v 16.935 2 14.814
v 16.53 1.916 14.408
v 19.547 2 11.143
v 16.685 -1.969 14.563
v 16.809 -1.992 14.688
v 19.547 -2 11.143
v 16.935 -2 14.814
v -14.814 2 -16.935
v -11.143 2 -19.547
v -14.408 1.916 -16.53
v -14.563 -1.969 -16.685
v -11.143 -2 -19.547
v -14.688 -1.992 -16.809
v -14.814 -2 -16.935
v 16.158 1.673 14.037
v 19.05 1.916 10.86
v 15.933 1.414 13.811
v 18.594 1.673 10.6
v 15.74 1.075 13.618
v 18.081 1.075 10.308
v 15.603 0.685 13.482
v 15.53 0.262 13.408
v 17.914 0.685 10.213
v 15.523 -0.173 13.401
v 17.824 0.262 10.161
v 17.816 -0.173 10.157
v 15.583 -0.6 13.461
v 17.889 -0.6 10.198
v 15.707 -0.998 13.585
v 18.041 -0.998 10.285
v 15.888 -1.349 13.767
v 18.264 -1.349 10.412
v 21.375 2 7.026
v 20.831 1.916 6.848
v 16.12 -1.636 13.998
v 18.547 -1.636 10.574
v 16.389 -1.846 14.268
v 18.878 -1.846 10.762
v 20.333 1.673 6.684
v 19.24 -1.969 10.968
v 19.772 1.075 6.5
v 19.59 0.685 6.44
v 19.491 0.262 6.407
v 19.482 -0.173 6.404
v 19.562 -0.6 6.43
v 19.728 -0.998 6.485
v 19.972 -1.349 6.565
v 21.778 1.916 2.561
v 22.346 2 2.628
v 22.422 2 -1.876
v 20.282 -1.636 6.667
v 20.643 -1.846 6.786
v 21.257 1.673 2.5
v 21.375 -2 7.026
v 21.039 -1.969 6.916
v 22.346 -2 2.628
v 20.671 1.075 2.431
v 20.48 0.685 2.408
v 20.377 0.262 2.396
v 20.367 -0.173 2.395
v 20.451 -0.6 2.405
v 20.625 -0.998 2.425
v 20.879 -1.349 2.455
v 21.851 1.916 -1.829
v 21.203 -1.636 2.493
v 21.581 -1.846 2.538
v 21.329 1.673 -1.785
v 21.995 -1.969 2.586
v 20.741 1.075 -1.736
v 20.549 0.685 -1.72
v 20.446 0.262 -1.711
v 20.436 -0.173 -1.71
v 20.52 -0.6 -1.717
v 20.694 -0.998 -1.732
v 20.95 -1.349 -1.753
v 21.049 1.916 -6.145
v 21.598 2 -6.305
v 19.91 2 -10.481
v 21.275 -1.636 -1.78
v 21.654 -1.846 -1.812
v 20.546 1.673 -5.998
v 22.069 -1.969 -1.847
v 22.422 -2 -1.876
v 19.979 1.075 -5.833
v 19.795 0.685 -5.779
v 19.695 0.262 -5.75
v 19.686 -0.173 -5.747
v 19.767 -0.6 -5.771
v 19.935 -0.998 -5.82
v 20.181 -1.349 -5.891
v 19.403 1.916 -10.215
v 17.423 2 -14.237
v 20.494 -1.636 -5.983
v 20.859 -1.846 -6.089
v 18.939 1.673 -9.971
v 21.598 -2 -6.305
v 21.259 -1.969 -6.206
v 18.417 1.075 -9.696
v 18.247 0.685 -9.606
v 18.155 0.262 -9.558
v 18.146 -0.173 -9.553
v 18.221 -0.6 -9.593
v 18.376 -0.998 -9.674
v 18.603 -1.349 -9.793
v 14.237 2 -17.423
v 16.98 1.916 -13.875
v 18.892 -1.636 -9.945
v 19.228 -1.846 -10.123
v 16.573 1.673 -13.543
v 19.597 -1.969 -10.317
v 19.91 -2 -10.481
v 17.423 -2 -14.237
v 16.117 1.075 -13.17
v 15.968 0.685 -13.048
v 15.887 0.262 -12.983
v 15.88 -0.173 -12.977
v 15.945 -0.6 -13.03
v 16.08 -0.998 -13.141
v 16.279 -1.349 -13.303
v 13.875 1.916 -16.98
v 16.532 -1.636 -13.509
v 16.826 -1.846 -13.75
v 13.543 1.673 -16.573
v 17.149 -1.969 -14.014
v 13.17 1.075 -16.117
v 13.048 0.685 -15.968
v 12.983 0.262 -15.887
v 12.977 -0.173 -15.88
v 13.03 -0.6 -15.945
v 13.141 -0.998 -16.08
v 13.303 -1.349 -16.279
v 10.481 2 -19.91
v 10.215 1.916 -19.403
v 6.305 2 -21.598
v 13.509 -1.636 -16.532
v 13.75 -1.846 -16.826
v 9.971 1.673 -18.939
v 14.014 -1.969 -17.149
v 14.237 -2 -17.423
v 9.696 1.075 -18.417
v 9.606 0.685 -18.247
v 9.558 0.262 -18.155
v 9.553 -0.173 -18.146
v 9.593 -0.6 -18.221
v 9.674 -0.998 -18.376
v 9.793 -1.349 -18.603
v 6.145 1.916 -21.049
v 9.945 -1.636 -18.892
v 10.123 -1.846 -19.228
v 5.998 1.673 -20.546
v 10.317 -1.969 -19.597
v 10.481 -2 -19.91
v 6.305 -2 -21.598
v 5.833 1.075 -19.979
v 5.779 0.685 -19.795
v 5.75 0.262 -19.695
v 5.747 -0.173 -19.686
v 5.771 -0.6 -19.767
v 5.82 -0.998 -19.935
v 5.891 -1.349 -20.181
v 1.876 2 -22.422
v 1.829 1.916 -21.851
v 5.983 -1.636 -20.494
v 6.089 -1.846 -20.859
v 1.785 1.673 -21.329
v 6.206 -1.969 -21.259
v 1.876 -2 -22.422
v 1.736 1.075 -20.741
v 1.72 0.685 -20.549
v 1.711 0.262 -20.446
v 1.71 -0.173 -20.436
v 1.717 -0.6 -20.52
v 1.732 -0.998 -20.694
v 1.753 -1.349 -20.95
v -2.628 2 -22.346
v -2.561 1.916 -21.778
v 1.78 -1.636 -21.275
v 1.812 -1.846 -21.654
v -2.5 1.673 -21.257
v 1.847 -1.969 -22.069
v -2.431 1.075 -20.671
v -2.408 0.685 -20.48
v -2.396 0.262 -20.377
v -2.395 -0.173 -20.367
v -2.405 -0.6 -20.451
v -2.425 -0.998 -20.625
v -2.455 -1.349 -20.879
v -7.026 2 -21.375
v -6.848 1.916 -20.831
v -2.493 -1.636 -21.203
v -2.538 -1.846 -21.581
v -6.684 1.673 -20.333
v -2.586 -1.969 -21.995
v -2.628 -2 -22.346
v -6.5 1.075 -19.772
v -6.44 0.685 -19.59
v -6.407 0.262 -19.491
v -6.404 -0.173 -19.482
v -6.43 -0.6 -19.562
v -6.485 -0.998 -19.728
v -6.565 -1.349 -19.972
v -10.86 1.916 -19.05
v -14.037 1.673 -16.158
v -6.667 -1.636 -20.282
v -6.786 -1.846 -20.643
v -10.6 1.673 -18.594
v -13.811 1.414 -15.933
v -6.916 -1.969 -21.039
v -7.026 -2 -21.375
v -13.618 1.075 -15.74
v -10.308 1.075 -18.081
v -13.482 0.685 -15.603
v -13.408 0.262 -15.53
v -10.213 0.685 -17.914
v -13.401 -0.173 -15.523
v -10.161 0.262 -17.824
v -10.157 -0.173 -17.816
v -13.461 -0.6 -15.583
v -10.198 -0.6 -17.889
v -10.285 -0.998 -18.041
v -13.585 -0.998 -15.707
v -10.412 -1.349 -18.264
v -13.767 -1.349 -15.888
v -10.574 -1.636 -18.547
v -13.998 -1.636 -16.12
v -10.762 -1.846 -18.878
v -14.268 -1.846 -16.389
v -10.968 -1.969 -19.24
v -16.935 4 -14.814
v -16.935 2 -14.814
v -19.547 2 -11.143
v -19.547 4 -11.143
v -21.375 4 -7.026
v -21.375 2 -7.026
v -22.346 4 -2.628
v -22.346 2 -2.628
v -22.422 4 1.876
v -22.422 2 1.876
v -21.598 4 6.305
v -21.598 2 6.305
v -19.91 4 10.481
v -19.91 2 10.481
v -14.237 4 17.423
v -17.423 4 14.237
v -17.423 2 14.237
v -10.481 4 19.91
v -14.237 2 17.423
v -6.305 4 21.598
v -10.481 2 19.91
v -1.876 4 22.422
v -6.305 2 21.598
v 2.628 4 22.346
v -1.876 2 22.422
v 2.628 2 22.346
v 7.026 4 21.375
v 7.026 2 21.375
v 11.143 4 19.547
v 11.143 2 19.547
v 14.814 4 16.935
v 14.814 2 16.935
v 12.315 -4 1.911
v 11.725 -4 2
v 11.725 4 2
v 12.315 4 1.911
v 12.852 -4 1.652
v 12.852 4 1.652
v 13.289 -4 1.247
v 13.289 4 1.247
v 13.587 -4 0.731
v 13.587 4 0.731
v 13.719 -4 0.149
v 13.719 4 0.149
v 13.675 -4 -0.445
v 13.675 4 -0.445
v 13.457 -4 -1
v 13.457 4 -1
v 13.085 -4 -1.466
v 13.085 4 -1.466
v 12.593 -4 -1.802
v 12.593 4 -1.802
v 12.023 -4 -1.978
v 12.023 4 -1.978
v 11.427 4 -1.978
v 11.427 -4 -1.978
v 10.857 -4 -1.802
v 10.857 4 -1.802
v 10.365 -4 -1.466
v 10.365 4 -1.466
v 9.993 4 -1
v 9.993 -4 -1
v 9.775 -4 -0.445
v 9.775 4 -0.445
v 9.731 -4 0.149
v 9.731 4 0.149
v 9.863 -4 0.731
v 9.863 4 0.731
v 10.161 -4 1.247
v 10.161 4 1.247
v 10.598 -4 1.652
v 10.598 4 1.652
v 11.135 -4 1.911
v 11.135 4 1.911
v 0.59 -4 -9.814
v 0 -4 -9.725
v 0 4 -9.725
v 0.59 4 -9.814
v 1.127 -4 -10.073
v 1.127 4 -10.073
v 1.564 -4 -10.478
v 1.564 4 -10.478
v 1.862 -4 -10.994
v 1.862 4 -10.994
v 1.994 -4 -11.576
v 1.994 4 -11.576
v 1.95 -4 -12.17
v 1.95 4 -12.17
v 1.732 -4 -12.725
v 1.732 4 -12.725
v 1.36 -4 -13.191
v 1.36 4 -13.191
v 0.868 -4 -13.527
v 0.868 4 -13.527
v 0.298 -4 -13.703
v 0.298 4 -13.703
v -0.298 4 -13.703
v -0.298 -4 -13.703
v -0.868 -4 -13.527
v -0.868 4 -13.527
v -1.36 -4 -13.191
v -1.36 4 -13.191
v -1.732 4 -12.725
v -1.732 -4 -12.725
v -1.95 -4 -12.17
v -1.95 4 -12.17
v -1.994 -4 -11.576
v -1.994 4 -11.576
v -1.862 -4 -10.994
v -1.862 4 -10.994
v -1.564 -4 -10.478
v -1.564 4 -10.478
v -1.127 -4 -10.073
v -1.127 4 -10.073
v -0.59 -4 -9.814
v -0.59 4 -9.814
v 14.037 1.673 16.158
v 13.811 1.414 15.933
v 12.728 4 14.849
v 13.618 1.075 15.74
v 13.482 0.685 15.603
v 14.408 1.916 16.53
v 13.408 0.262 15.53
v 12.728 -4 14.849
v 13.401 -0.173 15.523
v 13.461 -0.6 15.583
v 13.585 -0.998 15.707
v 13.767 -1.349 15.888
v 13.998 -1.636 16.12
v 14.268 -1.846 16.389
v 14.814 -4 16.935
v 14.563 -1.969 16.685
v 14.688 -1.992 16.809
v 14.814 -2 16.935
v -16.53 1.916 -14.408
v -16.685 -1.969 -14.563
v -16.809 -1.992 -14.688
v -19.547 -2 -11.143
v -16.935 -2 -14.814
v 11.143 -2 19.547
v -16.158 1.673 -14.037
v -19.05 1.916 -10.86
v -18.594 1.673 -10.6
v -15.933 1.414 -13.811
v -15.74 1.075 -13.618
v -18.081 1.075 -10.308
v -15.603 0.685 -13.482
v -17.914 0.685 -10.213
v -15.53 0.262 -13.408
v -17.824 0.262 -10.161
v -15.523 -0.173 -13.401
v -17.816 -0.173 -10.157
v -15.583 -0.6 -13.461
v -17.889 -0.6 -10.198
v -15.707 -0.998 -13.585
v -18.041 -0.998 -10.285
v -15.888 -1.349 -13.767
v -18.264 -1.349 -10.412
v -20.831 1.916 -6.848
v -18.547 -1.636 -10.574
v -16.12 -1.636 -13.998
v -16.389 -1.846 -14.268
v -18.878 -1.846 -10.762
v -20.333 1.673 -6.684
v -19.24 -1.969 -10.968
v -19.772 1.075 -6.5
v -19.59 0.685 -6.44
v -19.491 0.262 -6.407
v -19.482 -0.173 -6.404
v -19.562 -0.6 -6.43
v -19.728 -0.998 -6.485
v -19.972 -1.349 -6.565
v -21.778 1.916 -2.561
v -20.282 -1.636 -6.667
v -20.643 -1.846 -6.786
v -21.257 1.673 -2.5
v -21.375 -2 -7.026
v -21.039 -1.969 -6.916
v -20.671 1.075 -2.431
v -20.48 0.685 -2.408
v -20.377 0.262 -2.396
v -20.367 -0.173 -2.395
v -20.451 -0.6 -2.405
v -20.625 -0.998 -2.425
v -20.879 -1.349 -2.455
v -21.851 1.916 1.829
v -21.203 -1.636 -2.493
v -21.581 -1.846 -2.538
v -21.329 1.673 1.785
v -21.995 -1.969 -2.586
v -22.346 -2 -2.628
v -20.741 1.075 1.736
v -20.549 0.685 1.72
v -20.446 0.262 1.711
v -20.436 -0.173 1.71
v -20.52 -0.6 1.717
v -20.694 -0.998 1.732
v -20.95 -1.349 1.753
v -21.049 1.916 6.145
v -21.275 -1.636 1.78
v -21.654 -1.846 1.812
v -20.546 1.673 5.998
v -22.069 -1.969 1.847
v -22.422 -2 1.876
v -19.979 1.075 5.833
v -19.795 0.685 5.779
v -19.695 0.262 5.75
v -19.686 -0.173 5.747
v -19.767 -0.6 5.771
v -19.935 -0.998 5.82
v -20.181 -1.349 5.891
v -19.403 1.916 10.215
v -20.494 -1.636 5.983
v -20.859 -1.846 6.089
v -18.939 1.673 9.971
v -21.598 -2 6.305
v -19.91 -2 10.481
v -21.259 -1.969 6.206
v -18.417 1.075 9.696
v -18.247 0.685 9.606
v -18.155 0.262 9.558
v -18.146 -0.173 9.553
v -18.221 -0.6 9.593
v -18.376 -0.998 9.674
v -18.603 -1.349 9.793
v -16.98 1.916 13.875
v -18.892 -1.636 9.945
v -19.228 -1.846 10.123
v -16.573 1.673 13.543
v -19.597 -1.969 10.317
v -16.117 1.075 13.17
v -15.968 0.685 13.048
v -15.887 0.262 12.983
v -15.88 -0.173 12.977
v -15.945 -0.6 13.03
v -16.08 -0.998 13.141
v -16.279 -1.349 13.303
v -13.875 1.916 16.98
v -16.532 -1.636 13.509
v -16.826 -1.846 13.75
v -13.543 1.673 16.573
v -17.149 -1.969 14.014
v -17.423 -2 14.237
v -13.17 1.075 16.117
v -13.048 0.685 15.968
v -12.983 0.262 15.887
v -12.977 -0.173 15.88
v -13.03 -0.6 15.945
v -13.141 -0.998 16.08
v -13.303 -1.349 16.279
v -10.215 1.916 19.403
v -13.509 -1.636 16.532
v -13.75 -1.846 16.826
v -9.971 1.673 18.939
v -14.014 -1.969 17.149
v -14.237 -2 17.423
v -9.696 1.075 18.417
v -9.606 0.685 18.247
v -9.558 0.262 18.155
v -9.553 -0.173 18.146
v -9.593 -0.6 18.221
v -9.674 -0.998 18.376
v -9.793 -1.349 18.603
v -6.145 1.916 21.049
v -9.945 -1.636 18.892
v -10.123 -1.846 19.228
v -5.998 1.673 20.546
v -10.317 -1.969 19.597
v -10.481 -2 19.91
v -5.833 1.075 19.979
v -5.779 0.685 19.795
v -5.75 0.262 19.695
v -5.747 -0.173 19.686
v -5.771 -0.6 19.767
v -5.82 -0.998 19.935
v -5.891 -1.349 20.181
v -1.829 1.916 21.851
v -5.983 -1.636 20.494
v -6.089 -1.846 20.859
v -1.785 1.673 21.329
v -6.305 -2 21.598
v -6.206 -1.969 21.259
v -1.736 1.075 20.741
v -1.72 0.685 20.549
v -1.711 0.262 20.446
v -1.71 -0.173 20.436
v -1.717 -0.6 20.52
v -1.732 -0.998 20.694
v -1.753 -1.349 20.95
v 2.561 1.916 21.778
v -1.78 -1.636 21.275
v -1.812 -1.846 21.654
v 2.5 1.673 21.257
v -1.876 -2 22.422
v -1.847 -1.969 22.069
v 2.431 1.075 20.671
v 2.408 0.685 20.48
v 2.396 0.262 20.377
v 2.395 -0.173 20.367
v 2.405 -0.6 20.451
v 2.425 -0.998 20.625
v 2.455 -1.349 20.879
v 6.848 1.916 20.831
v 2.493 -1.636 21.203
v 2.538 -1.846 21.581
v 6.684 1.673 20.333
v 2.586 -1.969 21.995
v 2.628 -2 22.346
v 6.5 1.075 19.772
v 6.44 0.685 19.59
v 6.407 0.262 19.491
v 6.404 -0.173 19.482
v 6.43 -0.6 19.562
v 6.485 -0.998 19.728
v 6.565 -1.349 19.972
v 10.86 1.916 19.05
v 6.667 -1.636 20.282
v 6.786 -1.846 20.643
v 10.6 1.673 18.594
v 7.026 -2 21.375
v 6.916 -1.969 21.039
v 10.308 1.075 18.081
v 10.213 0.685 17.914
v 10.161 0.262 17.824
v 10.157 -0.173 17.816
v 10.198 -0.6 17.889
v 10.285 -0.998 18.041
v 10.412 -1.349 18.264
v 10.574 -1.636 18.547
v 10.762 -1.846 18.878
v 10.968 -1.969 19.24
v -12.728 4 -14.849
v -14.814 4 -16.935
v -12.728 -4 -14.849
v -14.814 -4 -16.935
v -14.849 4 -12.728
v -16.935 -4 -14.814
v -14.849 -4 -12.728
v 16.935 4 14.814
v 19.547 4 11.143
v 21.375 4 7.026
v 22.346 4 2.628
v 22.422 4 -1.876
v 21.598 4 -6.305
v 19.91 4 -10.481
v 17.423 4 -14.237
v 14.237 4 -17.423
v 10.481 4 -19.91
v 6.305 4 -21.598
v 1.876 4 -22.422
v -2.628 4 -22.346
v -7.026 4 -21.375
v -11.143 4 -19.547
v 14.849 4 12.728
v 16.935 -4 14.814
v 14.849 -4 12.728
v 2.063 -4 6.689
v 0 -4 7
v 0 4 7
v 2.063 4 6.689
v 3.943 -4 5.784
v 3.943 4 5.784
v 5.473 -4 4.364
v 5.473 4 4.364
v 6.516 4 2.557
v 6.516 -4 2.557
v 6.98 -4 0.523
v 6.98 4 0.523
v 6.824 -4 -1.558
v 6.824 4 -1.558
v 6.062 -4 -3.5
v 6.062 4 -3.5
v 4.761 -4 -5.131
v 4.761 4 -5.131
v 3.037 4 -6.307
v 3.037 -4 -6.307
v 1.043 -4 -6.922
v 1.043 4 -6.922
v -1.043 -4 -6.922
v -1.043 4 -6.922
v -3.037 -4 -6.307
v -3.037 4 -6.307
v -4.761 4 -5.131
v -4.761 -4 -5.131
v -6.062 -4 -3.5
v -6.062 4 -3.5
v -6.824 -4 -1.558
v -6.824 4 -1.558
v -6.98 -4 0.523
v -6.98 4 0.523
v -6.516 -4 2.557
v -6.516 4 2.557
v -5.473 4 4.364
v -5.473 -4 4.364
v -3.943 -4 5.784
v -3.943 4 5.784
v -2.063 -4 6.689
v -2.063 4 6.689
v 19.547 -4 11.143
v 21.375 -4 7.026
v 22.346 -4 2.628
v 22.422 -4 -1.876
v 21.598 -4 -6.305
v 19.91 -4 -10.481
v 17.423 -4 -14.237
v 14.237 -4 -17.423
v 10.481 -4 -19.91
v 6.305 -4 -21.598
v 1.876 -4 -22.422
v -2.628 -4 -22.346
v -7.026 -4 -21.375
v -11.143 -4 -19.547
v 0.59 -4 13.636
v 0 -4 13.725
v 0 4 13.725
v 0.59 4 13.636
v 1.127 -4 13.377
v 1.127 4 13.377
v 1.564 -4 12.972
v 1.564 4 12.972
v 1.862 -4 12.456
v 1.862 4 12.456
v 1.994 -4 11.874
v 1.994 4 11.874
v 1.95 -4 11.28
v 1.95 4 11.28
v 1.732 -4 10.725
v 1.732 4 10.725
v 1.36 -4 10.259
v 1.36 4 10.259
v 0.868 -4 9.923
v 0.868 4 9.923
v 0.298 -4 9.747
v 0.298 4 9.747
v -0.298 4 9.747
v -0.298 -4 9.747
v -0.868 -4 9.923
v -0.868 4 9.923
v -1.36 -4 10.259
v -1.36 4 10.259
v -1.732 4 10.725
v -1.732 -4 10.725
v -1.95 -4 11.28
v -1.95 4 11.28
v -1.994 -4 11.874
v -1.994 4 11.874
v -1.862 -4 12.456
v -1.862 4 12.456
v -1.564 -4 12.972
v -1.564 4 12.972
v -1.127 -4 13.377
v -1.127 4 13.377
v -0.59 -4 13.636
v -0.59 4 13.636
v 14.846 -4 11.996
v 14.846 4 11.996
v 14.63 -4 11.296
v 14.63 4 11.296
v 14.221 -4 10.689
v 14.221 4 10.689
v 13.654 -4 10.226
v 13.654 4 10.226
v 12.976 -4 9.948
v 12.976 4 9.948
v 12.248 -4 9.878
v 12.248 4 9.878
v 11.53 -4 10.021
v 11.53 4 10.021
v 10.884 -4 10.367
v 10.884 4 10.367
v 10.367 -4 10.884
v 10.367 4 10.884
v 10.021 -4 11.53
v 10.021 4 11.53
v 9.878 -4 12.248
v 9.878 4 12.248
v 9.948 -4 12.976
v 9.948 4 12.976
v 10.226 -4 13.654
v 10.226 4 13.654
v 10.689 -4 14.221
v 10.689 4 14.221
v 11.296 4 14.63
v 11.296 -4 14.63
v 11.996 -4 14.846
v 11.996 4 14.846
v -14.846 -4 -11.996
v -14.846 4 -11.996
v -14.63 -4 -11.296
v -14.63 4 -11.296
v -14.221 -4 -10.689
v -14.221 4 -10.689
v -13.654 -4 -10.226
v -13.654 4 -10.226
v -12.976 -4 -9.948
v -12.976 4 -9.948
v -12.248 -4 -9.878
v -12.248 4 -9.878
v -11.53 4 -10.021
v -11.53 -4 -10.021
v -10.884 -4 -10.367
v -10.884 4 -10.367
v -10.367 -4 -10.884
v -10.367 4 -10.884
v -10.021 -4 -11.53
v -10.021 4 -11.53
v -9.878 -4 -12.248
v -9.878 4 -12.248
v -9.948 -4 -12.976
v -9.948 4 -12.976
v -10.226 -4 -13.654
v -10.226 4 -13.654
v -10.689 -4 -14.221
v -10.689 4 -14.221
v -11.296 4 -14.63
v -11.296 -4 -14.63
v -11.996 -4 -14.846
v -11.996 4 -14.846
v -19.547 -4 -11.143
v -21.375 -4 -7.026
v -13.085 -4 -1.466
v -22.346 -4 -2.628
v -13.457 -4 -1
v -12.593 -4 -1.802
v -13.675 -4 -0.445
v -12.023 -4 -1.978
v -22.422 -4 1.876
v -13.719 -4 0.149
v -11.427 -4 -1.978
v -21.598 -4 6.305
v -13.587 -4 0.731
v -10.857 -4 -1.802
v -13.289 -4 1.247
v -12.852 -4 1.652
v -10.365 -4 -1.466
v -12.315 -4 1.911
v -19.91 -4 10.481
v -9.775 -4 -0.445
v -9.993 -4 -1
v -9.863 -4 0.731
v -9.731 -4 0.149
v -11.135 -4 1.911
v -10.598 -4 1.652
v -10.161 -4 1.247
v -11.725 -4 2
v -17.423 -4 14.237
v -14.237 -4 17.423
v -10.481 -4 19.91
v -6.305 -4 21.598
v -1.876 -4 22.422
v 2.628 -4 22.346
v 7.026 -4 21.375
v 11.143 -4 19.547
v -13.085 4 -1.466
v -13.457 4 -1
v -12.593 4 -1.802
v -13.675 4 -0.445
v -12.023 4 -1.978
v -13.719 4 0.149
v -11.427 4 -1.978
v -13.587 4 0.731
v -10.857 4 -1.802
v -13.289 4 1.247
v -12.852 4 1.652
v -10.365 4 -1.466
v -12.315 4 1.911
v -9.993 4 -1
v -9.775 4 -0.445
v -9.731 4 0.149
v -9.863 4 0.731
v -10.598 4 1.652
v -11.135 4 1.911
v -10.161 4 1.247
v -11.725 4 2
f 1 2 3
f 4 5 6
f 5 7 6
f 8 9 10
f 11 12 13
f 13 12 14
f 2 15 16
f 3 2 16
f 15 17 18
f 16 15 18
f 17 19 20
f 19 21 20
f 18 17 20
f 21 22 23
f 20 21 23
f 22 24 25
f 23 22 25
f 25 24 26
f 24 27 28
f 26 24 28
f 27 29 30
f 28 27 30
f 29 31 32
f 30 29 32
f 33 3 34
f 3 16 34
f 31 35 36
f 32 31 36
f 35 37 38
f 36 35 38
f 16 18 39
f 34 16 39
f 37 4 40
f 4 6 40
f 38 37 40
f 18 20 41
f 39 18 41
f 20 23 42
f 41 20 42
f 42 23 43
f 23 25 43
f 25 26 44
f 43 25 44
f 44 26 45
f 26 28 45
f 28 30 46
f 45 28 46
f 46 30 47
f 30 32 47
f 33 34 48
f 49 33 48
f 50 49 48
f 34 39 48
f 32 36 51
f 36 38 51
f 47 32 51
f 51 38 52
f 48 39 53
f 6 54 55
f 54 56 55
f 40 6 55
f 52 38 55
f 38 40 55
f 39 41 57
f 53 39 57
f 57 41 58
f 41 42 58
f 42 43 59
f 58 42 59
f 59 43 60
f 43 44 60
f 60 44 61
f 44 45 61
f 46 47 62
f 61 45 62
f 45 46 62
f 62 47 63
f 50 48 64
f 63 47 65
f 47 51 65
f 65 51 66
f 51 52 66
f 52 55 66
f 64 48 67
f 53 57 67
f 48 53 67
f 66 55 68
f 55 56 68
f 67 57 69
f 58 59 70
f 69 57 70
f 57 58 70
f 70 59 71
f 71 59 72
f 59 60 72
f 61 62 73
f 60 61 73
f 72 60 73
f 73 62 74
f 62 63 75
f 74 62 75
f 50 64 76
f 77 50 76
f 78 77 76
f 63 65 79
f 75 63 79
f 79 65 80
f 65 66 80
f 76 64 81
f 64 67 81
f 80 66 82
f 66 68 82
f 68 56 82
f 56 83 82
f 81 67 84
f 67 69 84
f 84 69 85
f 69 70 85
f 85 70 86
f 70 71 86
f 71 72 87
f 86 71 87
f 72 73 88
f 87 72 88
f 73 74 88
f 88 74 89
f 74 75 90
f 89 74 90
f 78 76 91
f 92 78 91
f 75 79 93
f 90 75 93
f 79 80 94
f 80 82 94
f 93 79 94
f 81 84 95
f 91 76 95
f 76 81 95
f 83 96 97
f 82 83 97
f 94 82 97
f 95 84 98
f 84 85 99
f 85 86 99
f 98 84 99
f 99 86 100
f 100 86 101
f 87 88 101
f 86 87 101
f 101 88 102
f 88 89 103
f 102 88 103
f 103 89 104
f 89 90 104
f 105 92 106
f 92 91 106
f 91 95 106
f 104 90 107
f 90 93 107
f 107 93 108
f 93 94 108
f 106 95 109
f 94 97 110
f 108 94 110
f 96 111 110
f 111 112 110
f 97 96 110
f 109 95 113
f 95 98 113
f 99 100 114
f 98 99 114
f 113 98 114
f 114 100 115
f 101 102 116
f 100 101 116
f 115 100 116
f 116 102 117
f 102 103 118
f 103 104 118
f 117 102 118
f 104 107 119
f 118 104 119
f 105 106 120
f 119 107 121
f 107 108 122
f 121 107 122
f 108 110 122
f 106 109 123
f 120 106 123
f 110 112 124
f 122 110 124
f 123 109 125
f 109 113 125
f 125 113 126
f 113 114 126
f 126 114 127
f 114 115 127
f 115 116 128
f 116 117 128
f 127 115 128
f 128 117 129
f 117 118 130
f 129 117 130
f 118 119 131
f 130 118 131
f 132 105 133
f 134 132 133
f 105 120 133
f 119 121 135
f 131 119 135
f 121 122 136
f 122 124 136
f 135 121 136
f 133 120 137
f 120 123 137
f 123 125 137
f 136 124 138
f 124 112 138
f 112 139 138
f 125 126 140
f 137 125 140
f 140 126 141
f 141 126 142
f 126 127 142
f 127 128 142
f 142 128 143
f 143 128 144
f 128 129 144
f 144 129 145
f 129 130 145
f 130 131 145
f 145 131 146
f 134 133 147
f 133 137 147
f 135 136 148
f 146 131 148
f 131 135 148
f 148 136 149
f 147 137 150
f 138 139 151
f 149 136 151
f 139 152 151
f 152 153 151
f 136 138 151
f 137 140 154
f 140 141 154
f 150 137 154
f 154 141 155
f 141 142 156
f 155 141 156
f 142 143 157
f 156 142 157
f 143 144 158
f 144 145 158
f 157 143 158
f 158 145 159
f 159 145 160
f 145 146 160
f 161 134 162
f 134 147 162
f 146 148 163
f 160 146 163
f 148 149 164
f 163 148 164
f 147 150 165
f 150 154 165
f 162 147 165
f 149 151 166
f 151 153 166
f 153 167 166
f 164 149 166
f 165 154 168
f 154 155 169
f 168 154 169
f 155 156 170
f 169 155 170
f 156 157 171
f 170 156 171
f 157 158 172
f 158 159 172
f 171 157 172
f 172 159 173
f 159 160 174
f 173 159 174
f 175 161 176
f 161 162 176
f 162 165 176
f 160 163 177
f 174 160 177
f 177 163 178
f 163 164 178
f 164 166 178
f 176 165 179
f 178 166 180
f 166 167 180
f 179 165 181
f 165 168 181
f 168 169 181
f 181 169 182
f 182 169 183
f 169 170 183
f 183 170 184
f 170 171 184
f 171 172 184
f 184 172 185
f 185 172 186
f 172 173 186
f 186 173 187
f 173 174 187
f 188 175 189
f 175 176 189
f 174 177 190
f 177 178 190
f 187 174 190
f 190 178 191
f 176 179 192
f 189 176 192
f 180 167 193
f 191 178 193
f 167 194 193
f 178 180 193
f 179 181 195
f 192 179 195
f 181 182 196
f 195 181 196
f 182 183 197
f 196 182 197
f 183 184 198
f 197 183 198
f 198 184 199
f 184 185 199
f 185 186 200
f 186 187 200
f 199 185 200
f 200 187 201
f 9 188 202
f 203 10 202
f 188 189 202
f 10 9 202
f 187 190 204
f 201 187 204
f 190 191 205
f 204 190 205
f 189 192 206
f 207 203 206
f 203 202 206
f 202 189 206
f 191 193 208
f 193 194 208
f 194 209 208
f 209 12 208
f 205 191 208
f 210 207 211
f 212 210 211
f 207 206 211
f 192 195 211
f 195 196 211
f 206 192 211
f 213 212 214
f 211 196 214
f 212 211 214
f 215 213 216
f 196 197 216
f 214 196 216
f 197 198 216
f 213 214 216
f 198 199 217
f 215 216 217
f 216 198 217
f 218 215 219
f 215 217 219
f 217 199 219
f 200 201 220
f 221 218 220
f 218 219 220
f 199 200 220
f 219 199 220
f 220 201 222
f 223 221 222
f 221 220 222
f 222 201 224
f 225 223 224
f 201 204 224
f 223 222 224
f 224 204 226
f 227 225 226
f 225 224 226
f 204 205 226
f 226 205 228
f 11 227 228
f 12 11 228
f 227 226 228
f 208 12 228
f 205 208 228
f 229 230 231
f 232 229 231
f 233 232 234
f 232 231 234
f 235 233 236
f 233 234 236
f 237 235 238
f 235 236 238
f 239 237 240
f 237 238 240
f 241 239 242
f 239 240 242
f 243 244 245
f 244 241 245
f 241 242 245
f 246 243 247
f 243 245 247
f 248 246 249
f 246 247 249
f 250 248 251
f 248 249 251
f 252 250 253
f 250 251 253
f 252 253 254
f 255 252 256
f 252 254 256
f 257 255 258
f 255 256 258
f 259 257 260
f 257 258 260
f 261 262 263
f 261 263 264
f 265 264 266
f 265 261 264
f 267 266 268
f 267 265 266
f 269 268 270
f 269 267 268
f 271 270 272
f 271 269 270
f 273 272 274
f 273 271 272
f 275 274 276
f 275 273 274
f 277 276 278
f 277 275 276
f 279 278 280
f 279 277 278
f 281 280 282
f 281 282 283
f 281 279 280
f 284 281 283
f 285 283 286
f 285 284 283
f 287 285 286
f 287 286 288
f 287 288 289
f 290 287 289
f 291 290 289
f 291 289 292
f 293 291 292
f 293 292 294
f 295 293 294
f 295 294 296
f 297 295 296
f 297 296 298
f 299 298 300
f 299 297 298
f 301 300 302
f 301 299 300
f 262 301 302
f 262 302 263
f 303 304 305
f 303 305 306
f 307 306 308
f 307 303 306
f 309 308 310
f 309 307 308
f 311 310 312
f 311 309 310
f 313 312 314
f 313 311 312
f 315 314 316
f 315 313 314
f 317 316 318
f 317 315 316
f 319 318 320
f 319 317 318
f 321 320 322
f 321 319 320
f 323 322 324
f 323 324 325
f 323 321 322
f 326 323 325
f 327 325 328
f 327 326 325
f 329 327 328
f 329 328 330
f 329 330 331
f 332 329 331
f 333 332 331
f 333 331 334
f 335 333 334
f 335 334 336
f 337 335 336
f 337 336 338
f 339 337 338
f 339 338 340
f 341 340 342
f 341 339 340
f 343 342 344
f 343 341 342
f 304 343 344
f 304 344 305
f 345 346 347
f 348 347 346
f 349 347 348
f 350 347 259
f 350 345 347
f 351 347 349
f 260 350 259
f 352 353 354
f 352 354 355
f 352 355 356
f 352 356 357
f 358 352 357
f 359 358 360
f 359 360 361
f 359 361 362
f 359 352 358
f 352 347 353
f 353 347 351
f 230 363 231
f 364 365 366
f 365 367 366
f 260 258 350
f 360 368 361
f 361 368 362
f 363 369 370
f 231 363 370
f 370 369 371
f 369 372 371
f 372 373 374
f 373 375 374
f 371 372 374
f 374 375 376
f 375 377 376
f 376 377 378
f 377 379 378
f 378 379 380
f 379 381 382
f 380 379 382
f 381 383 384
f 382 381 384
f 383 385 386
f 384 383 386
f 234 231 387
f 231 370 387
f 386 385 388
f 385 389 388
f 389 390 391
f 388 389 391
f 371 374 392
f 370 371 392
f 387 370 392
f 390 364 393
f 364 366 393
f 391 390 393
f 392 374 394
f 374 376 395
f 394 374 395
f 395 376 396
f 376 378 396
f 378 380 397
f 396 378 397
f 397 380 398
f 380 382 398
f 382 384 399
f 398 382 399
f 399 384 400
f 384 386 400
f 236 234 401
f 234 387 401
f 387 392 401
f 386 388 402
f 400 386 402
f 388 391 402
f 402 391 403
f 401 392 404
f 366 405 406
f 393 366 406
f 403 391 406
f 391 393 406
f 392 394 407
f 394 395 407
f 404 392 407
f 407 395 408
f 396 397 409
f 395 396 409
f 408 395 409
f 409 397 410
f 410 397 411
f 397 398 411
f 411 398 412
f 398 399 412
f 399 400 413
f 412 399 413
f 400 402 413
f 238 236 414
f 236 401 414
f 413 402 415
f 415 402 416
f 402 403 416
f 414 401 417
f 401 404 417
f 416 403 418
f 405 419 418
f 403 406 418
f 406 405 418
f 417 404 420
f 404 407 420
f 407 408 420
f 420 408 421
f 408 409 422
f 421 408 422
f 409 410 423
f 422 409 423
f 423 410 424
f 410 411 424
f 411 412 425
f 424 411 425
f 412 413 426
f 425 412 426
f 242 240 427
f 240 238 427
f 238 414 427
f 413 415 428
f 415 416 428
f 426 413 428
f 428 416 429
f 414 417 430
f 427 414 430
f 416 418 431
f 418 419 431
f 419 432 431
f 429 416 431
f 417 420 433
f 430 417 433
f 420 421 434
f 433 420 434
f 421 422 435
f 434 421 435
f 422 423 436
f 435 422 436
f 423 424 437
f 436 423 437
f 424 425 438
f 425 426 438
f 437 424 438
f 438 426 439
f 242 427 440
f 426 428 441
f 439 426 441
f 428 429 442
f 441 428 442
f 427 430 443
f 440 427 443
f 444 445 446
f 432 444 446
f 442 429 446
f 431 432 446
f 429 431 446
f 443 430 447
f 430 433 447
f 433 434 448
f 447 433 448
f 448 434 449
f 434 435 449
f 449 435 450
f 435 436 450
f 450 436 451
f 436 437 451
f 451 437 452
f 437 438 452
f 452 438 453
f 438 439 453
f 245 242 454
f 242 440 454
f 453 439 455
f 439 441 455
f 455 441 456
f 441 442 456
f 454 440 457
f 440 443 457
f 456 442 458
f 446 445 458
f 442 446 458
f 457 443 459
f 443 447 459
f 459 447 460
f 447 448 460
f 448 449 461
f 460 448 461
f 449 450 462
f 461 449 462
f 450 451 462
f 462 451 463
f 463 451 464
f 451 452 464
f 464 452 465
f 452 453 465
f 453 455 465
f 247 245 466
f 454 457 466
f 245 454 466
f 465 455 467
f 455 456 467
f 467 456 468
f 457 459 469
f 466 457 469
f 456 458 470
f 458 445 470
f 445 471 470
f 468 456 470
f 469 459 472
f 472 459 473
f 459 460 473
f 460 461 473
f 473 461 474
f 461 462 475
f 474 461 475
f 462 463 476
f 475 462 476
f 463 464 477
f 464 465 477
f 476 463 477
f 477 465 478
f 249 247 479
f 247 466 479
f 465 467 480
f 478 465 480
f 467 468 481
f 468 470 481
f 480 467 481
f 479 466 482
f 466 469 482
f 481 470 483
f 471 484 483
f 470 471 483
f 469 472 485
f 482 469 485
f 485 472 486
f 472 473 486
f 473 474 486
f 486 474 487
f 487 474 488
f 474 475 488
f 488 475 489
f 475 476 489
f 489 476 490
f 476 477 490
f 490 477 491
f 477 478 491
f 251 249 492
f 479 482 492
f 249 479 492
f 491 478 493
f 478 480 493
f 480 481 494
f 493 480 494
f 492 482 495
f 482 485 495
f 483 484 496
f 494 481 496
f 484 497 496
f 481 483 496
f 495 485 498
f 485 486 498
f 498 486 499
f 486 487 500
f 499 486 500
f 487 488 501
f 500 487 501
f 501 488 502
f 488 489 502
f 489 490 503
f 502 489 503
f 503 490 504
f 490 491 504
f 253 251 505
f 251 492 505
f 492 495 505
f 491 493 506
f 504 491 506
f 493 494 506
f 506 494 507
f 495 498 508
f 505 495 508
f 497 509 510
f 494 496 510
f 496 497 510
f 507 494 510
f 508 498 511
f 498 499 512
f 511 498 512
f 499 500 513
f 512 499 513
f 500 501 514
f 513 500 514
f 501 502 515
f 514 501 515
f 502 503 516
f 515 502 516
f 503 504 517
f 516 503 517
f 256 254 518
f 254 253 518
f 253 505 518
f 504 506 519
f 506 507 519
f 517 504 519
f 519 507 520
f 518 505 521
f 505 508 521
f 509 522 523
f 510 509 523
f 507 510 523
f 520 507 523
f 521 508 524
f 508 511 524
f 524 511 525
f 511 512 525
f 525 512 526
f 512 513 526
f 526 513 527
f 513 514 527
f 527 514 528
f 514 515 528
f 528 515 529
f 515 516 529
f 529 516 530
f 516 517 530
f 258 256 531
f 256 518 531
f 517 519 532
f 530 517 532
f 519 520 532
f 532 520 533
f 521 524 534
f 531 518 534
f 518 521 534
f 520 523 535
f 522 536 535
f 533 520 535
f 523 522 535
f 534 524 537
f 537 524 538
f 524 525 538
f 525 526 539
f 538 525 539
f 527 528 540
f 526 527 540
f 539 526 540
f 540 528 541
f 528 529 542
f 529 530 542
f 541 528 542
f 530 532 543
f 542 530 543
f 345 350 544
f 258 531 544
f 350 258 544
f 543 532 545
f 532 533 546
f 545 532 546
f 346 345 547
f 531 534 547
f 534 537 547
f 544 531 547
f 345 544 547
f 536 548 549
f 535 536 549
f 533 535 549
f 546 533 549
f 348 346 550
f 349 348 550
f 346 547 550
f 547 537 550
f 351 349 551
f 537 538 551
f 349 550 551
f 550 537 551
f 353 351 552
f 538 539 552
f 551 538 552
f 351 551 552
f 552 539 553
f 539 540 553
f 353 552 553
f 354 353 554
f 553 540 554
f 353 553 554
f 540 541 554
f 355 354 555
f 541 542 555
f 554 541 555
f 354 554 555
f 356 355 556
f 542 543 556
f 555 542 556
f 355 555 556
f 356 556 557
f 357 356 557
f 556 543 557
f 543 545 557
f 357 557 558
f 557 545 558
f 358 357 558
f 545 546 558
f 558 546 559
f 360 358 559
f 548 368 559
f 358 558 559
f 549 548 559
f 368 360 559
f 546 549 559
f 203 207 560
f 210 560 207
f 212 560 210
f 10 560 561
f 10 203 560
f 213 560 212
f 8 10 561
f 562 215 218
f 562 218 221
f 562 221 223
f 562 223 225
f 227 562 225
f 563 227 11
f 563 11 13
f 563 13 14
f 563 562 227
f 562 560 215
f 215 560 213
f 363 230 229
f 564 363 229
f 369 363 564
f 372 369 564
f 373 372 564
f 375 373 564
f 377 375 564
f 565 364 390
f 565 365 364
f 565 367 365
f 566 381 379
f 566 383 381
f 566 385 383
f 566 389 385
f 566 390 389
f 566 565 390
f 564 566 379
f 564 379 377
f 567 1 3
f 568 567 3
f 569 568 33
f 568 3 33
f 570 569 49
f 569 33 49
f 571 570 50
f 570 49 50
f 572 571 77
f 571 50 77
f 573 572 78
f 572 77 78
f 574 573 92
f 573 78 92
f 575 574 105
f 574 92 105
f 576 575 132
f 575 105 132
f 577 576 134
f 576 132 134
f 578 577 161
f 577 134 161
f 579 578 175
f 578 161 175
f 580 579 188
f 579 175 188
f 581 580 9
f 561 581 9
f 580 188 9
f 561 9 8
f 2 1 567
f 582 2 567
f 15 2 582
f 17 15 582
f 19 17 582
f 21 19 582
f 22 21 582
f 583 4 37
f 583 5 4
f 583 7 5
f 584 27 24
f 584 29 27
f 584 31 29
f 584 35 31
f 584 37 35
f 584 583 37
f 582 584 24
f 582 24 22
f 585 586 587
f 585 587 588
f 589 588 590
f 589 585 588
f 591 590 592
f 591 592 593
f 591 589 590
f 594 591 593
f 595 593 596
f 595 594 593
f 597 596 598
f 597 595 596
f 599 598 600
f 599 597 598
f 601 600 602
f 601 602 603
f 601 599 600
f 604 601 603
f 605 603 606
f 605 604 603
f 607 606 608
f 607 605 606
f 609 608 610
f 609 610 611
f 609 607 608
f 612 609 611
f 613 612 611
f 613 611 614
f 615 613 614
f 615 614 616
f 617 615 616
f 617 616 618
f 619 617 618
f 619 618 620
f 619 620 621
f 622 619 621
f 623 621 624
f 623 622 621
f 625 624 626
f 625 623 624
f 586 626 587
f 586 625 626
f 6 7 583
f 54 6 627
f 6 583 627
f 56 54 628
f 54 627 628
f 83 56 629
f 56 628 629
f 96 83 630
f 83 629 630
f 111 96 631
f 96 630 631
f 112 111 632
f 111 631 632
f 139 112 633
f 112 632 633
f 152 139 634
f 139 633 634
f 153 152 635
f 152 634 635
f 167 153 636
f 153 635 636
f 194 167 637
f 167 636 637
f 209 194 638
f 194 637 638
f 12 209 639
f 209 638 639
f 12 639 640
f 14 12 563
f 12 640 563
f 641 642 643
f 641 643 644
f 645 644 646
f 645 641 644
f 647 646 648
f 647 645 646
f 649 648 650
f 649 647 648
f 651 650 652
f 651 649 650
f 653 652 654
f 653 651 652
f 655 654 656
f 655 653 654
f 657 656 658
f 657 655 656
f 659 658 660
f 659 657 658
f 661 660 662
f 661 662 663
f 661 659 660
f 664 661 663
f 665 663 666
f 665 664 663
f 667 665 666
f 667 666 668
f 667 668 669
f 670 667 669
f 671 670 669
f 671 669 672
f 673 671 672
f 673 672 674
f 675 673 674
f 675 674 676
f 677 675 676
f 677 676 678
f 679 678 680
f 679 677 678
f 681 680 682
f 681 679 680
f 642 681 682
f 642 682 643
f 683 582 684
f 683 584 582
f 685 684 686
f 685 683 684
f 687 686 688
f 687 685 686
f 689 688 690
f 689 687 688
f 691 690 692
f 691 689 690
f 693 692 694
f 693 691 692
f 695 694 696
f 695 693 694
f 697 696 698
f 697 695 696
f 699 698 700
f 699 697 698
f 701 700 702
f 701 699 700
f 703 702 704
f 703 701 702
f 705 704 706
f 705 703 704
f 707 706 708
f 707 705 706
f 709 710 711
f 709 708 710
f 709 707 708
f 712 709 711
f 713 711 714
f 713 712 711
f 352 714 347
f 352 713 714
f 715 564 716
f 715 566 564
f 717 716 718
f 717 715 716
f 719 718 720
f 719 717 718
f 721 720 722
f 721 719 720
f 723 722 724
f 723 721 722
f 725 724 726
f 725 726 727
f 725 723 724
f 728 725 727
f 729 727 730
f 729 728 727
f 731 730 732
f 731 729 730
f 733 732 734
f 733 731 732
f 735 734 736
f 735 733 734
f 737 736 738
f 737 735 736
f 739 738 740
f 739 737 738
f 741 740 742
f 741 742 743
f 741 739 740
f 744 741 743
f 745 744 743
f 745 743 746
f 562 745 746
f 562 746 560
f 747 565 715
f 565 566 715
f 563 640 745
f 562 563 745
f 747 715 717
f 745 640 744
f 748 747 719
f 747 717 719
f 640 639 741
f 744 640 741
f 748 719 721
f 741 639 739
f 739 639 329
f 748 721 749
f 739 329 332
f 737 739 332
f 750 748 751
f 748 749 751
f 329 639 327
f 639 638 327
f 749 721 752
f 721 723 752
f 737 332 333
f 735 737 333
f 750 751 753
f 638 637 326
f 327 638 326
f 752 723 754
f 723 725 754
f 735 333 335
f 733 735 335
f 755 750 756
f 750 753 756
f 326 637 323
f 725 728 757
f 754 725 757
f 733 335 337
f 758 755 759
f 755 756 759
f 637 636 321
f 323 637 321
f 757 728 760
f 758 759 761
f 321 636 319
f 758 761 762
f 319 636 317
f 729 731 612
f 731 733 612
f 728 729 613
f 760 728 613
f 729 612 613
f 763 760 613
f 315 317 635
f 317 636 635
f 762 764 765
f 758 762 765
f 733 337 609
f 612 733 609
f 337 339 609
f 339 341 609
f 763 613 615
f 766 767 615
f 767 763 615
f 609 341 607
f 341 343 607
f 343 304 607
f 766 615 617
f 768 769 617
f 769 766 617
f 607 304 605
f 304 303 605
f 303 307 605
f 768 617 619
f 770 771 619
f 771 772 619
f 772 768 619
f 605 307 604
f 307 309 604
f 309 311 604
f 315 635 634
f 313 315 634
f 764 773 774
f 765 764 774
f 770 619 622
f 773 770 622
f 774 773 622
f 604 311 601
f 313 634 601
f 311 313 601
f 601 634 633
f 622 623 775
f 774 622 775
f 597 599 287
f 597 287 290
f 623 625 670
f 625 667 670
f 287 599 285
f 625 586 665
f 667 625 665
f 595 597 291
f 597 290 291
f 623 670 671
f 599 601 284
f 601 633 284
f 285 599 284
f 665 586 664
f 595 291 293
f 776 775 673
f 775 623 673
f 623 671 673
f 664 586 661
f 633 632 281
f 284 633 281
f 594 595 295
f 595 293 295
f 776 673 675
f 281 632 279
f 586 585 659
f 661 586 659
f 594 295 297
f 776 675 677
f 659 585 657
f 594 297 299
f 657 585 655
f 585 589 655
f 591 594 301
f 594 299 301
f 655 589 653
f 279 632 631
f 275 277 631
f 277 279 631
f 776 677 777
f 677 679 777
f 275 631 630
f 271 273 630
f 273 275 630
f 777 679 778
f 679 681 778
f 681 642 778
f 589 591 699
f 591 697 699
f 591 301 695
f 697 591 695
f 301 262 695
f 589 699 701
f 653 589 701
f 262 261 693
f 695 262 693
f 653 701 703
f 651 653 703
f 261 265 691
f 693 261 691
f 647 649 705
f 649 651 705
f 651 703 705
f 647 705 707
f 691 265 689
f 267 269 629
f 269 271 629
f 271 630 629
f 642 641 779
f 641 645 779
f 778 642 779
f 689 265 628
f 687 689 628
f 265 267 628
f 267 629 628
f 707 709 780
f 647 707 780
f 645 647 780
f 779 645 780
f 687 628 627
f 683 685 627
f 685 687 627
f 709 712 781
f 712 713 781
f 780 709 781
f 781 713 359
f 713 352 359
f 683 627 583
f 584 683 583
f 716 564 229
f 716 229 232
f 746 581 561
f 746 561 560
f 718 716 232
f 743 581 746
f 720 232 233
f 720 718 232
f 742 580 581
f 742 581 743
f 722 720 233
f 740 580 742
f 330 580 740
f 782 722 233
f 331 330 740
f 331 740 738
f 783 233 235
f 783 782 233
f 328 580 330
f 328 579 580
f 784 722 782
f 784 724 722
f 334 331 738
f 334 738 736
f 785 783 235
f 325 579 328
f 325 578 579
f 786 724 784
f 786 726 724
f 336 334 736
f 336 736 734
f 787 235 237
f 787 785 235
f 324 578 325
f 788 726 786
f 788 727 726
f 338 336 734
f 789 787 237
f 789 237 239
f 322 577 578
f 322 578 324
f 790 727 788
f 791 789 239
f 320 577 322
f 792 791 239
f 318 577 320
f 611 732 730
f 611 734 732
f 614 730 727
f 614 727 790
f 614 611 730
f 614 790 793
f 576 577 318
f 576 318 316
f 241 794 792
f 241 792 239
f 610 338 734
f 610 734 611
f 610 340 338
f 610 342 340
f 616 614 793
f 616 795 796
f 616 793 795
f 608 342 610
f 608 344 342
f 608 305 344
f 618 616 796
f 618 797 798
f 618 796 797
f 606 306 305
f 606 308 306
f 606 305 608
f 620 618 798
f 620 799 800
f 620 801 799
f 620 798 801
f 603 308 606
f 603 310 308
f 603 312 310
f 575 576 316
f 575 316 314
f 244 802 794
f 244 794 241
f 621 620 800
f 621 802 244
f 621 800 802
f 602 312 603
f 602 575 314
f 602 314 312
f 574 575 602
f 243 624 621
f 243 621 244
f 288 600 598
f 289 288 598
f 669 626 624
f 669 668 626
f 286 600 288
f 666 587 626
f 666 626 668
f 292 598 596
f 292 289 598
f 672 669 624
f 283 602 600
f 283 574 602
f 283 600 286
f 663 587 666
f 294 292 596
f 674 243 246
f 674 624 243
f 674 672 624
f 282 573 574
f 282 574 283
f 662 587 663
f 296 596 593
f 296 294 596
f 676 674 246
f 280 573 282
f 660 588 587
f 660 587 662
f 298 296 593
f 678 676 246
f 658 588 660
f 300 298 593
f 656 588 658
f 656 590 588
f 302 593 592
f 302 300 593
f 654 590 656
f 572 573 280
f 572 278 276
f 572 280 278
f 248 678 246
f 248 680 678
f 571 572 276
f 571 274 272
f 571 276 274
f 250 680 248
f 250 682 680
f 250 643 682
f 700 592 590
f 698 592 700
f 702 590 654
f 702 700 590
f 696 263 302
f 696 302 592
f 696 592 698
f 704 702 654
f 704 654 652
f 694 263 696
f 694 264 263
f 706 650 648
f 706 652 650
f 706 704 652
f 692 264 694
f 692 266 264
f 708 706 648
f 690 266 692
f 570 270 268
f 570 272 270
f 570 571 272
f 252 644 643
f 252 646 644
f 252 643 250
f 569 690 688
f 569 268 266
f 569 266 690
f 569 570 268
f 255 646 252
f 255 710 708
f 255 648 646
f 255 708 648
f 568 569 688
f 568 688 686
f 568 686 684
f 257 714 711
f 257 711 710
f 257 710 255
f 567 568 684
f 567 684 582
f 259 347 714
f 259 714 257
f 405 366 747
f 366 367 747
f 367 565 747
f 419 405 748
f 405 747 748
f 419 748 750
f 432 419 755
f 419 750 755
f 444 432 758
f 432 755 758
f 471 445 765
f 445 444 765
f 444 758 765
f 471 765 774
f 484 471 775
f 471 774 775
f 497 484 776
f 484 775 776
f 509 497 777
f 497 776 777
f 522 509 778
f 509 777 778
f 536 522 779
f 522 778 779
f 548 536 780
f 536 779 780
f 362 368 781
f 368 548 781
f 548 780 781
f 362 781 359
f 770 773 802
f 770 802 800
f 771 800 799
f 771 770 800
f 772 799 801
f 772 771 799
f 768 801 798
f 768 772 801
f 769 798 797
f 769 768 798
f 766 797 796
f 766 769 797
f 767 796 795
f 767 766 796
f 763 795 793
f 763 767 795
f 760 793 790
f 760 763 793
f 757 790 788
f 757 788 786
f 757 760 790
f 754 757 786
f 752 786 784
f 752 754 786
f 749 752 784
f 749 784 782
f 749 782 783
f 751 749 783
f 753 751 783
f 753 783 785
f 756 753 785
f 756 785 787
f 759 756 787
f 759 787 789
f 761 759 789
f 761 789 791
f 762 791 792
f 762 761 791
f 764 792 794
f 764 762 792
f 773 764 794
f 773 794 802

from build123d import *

# Parameters (mm, degrees)
BOSS_EXTRUDE1_DEPTH      = 4
BOSS_EXTRUDE1_DEPTH_BACK = 4
SKETCH1_R                = 22.5
SKETCH1_R_2              = 7
SKETCH1_R_3              = 2
SKETCH1_R_4              = 2.5
SKETCH2_R                = 2
CUT_EXTRUDE1_DEPTH       = 4
CUT_EXTRUDE1_DEPTH_BACK  = 4


with BuildPart() as part:
    # Sketch1 → Boss-Extrude1 (new, two sides: drawn at the far end of the back side and taken through both)
    with BuildSketch(Plane(origin=(0, 0, 0), x_dir=(1, 0, 0), z_dir=(0, 1, 0)).offset(-BOSS_EXTRUDE1_DEPTH_BACK)):
        Circle(SKETCH1_R)
        Circle(SKETCH1_R_2, mode=Mode.SUBTRACT)
        with Locations((0, 11.725)):
            Circle(SKETCH1_R_3, mode=Mode.SUBTRACT)
        with Locations((11.725, 0)):
            Circle(SKETCH1_R_3, mode=Mode.SUBTRACT)
        with Locations((0, -11.725)):
            Circle(SKETCH1_R_3, mode=Mode.SUBTRACT)
        with Locations((-11.725, 0)):
            Circle(SKETCH1_R_3, mode=Mode.SUBTRACT)
        with Locations((-12.374368671, 12.374368671)):
            Circle(SKETCH1_R_4, mode=Mode.SUBTRACT)
        with Locations((12.374368671, -12.374368671)):
            Circle(SKETCH1_R_4, mode=Mode.SUBTRACT)
    extrude(amount=BOSS_EXTRUDE1_DEPTH + BOSS_EXTRUDE1_DEPTH_BACK)

    # Sketch2 → Cut-Revolve7 (revolve, cut)
    with BuildSketch(Plane.XY):
        with Locations((22.5, 0)):
            Circle(SKETCH2_R)
    revolve(axis=Axis((0, 0, 0), (0, 1, 0)), mode=Mode.SUBTRACT)

    # Sketch3 → Cut-Extrude1 (cut, two sides: drawn at the far end of the back side and taken through both)
    with BuildSketch(Plane(origin=(0, 0, 0), x_dir=(1, 0, 0), z_dir=(0, 1, 0)).offset(-CUT_EXTRUDE1_DEPTH_BACK)):
        Polygon((-18.384776311, 16.263455967), (-13.435028843, 11.313708499), (-11.313708499, 13.435028843), (-16.263455967, 18.384776311), align=None)
        Polygon((13.435028843, -11.313708499), (11.313708499, -13.435028843), (16.263455967, -18.384776311), (18.384776311, -16.263455967), align=None)
    extrude(amount=CUT_EXTRUDE1_DEPTH + CUT_EXTRUDE1_DEPTH_BACK, mode=Mode.SUBTRACT)


solid = part.part
